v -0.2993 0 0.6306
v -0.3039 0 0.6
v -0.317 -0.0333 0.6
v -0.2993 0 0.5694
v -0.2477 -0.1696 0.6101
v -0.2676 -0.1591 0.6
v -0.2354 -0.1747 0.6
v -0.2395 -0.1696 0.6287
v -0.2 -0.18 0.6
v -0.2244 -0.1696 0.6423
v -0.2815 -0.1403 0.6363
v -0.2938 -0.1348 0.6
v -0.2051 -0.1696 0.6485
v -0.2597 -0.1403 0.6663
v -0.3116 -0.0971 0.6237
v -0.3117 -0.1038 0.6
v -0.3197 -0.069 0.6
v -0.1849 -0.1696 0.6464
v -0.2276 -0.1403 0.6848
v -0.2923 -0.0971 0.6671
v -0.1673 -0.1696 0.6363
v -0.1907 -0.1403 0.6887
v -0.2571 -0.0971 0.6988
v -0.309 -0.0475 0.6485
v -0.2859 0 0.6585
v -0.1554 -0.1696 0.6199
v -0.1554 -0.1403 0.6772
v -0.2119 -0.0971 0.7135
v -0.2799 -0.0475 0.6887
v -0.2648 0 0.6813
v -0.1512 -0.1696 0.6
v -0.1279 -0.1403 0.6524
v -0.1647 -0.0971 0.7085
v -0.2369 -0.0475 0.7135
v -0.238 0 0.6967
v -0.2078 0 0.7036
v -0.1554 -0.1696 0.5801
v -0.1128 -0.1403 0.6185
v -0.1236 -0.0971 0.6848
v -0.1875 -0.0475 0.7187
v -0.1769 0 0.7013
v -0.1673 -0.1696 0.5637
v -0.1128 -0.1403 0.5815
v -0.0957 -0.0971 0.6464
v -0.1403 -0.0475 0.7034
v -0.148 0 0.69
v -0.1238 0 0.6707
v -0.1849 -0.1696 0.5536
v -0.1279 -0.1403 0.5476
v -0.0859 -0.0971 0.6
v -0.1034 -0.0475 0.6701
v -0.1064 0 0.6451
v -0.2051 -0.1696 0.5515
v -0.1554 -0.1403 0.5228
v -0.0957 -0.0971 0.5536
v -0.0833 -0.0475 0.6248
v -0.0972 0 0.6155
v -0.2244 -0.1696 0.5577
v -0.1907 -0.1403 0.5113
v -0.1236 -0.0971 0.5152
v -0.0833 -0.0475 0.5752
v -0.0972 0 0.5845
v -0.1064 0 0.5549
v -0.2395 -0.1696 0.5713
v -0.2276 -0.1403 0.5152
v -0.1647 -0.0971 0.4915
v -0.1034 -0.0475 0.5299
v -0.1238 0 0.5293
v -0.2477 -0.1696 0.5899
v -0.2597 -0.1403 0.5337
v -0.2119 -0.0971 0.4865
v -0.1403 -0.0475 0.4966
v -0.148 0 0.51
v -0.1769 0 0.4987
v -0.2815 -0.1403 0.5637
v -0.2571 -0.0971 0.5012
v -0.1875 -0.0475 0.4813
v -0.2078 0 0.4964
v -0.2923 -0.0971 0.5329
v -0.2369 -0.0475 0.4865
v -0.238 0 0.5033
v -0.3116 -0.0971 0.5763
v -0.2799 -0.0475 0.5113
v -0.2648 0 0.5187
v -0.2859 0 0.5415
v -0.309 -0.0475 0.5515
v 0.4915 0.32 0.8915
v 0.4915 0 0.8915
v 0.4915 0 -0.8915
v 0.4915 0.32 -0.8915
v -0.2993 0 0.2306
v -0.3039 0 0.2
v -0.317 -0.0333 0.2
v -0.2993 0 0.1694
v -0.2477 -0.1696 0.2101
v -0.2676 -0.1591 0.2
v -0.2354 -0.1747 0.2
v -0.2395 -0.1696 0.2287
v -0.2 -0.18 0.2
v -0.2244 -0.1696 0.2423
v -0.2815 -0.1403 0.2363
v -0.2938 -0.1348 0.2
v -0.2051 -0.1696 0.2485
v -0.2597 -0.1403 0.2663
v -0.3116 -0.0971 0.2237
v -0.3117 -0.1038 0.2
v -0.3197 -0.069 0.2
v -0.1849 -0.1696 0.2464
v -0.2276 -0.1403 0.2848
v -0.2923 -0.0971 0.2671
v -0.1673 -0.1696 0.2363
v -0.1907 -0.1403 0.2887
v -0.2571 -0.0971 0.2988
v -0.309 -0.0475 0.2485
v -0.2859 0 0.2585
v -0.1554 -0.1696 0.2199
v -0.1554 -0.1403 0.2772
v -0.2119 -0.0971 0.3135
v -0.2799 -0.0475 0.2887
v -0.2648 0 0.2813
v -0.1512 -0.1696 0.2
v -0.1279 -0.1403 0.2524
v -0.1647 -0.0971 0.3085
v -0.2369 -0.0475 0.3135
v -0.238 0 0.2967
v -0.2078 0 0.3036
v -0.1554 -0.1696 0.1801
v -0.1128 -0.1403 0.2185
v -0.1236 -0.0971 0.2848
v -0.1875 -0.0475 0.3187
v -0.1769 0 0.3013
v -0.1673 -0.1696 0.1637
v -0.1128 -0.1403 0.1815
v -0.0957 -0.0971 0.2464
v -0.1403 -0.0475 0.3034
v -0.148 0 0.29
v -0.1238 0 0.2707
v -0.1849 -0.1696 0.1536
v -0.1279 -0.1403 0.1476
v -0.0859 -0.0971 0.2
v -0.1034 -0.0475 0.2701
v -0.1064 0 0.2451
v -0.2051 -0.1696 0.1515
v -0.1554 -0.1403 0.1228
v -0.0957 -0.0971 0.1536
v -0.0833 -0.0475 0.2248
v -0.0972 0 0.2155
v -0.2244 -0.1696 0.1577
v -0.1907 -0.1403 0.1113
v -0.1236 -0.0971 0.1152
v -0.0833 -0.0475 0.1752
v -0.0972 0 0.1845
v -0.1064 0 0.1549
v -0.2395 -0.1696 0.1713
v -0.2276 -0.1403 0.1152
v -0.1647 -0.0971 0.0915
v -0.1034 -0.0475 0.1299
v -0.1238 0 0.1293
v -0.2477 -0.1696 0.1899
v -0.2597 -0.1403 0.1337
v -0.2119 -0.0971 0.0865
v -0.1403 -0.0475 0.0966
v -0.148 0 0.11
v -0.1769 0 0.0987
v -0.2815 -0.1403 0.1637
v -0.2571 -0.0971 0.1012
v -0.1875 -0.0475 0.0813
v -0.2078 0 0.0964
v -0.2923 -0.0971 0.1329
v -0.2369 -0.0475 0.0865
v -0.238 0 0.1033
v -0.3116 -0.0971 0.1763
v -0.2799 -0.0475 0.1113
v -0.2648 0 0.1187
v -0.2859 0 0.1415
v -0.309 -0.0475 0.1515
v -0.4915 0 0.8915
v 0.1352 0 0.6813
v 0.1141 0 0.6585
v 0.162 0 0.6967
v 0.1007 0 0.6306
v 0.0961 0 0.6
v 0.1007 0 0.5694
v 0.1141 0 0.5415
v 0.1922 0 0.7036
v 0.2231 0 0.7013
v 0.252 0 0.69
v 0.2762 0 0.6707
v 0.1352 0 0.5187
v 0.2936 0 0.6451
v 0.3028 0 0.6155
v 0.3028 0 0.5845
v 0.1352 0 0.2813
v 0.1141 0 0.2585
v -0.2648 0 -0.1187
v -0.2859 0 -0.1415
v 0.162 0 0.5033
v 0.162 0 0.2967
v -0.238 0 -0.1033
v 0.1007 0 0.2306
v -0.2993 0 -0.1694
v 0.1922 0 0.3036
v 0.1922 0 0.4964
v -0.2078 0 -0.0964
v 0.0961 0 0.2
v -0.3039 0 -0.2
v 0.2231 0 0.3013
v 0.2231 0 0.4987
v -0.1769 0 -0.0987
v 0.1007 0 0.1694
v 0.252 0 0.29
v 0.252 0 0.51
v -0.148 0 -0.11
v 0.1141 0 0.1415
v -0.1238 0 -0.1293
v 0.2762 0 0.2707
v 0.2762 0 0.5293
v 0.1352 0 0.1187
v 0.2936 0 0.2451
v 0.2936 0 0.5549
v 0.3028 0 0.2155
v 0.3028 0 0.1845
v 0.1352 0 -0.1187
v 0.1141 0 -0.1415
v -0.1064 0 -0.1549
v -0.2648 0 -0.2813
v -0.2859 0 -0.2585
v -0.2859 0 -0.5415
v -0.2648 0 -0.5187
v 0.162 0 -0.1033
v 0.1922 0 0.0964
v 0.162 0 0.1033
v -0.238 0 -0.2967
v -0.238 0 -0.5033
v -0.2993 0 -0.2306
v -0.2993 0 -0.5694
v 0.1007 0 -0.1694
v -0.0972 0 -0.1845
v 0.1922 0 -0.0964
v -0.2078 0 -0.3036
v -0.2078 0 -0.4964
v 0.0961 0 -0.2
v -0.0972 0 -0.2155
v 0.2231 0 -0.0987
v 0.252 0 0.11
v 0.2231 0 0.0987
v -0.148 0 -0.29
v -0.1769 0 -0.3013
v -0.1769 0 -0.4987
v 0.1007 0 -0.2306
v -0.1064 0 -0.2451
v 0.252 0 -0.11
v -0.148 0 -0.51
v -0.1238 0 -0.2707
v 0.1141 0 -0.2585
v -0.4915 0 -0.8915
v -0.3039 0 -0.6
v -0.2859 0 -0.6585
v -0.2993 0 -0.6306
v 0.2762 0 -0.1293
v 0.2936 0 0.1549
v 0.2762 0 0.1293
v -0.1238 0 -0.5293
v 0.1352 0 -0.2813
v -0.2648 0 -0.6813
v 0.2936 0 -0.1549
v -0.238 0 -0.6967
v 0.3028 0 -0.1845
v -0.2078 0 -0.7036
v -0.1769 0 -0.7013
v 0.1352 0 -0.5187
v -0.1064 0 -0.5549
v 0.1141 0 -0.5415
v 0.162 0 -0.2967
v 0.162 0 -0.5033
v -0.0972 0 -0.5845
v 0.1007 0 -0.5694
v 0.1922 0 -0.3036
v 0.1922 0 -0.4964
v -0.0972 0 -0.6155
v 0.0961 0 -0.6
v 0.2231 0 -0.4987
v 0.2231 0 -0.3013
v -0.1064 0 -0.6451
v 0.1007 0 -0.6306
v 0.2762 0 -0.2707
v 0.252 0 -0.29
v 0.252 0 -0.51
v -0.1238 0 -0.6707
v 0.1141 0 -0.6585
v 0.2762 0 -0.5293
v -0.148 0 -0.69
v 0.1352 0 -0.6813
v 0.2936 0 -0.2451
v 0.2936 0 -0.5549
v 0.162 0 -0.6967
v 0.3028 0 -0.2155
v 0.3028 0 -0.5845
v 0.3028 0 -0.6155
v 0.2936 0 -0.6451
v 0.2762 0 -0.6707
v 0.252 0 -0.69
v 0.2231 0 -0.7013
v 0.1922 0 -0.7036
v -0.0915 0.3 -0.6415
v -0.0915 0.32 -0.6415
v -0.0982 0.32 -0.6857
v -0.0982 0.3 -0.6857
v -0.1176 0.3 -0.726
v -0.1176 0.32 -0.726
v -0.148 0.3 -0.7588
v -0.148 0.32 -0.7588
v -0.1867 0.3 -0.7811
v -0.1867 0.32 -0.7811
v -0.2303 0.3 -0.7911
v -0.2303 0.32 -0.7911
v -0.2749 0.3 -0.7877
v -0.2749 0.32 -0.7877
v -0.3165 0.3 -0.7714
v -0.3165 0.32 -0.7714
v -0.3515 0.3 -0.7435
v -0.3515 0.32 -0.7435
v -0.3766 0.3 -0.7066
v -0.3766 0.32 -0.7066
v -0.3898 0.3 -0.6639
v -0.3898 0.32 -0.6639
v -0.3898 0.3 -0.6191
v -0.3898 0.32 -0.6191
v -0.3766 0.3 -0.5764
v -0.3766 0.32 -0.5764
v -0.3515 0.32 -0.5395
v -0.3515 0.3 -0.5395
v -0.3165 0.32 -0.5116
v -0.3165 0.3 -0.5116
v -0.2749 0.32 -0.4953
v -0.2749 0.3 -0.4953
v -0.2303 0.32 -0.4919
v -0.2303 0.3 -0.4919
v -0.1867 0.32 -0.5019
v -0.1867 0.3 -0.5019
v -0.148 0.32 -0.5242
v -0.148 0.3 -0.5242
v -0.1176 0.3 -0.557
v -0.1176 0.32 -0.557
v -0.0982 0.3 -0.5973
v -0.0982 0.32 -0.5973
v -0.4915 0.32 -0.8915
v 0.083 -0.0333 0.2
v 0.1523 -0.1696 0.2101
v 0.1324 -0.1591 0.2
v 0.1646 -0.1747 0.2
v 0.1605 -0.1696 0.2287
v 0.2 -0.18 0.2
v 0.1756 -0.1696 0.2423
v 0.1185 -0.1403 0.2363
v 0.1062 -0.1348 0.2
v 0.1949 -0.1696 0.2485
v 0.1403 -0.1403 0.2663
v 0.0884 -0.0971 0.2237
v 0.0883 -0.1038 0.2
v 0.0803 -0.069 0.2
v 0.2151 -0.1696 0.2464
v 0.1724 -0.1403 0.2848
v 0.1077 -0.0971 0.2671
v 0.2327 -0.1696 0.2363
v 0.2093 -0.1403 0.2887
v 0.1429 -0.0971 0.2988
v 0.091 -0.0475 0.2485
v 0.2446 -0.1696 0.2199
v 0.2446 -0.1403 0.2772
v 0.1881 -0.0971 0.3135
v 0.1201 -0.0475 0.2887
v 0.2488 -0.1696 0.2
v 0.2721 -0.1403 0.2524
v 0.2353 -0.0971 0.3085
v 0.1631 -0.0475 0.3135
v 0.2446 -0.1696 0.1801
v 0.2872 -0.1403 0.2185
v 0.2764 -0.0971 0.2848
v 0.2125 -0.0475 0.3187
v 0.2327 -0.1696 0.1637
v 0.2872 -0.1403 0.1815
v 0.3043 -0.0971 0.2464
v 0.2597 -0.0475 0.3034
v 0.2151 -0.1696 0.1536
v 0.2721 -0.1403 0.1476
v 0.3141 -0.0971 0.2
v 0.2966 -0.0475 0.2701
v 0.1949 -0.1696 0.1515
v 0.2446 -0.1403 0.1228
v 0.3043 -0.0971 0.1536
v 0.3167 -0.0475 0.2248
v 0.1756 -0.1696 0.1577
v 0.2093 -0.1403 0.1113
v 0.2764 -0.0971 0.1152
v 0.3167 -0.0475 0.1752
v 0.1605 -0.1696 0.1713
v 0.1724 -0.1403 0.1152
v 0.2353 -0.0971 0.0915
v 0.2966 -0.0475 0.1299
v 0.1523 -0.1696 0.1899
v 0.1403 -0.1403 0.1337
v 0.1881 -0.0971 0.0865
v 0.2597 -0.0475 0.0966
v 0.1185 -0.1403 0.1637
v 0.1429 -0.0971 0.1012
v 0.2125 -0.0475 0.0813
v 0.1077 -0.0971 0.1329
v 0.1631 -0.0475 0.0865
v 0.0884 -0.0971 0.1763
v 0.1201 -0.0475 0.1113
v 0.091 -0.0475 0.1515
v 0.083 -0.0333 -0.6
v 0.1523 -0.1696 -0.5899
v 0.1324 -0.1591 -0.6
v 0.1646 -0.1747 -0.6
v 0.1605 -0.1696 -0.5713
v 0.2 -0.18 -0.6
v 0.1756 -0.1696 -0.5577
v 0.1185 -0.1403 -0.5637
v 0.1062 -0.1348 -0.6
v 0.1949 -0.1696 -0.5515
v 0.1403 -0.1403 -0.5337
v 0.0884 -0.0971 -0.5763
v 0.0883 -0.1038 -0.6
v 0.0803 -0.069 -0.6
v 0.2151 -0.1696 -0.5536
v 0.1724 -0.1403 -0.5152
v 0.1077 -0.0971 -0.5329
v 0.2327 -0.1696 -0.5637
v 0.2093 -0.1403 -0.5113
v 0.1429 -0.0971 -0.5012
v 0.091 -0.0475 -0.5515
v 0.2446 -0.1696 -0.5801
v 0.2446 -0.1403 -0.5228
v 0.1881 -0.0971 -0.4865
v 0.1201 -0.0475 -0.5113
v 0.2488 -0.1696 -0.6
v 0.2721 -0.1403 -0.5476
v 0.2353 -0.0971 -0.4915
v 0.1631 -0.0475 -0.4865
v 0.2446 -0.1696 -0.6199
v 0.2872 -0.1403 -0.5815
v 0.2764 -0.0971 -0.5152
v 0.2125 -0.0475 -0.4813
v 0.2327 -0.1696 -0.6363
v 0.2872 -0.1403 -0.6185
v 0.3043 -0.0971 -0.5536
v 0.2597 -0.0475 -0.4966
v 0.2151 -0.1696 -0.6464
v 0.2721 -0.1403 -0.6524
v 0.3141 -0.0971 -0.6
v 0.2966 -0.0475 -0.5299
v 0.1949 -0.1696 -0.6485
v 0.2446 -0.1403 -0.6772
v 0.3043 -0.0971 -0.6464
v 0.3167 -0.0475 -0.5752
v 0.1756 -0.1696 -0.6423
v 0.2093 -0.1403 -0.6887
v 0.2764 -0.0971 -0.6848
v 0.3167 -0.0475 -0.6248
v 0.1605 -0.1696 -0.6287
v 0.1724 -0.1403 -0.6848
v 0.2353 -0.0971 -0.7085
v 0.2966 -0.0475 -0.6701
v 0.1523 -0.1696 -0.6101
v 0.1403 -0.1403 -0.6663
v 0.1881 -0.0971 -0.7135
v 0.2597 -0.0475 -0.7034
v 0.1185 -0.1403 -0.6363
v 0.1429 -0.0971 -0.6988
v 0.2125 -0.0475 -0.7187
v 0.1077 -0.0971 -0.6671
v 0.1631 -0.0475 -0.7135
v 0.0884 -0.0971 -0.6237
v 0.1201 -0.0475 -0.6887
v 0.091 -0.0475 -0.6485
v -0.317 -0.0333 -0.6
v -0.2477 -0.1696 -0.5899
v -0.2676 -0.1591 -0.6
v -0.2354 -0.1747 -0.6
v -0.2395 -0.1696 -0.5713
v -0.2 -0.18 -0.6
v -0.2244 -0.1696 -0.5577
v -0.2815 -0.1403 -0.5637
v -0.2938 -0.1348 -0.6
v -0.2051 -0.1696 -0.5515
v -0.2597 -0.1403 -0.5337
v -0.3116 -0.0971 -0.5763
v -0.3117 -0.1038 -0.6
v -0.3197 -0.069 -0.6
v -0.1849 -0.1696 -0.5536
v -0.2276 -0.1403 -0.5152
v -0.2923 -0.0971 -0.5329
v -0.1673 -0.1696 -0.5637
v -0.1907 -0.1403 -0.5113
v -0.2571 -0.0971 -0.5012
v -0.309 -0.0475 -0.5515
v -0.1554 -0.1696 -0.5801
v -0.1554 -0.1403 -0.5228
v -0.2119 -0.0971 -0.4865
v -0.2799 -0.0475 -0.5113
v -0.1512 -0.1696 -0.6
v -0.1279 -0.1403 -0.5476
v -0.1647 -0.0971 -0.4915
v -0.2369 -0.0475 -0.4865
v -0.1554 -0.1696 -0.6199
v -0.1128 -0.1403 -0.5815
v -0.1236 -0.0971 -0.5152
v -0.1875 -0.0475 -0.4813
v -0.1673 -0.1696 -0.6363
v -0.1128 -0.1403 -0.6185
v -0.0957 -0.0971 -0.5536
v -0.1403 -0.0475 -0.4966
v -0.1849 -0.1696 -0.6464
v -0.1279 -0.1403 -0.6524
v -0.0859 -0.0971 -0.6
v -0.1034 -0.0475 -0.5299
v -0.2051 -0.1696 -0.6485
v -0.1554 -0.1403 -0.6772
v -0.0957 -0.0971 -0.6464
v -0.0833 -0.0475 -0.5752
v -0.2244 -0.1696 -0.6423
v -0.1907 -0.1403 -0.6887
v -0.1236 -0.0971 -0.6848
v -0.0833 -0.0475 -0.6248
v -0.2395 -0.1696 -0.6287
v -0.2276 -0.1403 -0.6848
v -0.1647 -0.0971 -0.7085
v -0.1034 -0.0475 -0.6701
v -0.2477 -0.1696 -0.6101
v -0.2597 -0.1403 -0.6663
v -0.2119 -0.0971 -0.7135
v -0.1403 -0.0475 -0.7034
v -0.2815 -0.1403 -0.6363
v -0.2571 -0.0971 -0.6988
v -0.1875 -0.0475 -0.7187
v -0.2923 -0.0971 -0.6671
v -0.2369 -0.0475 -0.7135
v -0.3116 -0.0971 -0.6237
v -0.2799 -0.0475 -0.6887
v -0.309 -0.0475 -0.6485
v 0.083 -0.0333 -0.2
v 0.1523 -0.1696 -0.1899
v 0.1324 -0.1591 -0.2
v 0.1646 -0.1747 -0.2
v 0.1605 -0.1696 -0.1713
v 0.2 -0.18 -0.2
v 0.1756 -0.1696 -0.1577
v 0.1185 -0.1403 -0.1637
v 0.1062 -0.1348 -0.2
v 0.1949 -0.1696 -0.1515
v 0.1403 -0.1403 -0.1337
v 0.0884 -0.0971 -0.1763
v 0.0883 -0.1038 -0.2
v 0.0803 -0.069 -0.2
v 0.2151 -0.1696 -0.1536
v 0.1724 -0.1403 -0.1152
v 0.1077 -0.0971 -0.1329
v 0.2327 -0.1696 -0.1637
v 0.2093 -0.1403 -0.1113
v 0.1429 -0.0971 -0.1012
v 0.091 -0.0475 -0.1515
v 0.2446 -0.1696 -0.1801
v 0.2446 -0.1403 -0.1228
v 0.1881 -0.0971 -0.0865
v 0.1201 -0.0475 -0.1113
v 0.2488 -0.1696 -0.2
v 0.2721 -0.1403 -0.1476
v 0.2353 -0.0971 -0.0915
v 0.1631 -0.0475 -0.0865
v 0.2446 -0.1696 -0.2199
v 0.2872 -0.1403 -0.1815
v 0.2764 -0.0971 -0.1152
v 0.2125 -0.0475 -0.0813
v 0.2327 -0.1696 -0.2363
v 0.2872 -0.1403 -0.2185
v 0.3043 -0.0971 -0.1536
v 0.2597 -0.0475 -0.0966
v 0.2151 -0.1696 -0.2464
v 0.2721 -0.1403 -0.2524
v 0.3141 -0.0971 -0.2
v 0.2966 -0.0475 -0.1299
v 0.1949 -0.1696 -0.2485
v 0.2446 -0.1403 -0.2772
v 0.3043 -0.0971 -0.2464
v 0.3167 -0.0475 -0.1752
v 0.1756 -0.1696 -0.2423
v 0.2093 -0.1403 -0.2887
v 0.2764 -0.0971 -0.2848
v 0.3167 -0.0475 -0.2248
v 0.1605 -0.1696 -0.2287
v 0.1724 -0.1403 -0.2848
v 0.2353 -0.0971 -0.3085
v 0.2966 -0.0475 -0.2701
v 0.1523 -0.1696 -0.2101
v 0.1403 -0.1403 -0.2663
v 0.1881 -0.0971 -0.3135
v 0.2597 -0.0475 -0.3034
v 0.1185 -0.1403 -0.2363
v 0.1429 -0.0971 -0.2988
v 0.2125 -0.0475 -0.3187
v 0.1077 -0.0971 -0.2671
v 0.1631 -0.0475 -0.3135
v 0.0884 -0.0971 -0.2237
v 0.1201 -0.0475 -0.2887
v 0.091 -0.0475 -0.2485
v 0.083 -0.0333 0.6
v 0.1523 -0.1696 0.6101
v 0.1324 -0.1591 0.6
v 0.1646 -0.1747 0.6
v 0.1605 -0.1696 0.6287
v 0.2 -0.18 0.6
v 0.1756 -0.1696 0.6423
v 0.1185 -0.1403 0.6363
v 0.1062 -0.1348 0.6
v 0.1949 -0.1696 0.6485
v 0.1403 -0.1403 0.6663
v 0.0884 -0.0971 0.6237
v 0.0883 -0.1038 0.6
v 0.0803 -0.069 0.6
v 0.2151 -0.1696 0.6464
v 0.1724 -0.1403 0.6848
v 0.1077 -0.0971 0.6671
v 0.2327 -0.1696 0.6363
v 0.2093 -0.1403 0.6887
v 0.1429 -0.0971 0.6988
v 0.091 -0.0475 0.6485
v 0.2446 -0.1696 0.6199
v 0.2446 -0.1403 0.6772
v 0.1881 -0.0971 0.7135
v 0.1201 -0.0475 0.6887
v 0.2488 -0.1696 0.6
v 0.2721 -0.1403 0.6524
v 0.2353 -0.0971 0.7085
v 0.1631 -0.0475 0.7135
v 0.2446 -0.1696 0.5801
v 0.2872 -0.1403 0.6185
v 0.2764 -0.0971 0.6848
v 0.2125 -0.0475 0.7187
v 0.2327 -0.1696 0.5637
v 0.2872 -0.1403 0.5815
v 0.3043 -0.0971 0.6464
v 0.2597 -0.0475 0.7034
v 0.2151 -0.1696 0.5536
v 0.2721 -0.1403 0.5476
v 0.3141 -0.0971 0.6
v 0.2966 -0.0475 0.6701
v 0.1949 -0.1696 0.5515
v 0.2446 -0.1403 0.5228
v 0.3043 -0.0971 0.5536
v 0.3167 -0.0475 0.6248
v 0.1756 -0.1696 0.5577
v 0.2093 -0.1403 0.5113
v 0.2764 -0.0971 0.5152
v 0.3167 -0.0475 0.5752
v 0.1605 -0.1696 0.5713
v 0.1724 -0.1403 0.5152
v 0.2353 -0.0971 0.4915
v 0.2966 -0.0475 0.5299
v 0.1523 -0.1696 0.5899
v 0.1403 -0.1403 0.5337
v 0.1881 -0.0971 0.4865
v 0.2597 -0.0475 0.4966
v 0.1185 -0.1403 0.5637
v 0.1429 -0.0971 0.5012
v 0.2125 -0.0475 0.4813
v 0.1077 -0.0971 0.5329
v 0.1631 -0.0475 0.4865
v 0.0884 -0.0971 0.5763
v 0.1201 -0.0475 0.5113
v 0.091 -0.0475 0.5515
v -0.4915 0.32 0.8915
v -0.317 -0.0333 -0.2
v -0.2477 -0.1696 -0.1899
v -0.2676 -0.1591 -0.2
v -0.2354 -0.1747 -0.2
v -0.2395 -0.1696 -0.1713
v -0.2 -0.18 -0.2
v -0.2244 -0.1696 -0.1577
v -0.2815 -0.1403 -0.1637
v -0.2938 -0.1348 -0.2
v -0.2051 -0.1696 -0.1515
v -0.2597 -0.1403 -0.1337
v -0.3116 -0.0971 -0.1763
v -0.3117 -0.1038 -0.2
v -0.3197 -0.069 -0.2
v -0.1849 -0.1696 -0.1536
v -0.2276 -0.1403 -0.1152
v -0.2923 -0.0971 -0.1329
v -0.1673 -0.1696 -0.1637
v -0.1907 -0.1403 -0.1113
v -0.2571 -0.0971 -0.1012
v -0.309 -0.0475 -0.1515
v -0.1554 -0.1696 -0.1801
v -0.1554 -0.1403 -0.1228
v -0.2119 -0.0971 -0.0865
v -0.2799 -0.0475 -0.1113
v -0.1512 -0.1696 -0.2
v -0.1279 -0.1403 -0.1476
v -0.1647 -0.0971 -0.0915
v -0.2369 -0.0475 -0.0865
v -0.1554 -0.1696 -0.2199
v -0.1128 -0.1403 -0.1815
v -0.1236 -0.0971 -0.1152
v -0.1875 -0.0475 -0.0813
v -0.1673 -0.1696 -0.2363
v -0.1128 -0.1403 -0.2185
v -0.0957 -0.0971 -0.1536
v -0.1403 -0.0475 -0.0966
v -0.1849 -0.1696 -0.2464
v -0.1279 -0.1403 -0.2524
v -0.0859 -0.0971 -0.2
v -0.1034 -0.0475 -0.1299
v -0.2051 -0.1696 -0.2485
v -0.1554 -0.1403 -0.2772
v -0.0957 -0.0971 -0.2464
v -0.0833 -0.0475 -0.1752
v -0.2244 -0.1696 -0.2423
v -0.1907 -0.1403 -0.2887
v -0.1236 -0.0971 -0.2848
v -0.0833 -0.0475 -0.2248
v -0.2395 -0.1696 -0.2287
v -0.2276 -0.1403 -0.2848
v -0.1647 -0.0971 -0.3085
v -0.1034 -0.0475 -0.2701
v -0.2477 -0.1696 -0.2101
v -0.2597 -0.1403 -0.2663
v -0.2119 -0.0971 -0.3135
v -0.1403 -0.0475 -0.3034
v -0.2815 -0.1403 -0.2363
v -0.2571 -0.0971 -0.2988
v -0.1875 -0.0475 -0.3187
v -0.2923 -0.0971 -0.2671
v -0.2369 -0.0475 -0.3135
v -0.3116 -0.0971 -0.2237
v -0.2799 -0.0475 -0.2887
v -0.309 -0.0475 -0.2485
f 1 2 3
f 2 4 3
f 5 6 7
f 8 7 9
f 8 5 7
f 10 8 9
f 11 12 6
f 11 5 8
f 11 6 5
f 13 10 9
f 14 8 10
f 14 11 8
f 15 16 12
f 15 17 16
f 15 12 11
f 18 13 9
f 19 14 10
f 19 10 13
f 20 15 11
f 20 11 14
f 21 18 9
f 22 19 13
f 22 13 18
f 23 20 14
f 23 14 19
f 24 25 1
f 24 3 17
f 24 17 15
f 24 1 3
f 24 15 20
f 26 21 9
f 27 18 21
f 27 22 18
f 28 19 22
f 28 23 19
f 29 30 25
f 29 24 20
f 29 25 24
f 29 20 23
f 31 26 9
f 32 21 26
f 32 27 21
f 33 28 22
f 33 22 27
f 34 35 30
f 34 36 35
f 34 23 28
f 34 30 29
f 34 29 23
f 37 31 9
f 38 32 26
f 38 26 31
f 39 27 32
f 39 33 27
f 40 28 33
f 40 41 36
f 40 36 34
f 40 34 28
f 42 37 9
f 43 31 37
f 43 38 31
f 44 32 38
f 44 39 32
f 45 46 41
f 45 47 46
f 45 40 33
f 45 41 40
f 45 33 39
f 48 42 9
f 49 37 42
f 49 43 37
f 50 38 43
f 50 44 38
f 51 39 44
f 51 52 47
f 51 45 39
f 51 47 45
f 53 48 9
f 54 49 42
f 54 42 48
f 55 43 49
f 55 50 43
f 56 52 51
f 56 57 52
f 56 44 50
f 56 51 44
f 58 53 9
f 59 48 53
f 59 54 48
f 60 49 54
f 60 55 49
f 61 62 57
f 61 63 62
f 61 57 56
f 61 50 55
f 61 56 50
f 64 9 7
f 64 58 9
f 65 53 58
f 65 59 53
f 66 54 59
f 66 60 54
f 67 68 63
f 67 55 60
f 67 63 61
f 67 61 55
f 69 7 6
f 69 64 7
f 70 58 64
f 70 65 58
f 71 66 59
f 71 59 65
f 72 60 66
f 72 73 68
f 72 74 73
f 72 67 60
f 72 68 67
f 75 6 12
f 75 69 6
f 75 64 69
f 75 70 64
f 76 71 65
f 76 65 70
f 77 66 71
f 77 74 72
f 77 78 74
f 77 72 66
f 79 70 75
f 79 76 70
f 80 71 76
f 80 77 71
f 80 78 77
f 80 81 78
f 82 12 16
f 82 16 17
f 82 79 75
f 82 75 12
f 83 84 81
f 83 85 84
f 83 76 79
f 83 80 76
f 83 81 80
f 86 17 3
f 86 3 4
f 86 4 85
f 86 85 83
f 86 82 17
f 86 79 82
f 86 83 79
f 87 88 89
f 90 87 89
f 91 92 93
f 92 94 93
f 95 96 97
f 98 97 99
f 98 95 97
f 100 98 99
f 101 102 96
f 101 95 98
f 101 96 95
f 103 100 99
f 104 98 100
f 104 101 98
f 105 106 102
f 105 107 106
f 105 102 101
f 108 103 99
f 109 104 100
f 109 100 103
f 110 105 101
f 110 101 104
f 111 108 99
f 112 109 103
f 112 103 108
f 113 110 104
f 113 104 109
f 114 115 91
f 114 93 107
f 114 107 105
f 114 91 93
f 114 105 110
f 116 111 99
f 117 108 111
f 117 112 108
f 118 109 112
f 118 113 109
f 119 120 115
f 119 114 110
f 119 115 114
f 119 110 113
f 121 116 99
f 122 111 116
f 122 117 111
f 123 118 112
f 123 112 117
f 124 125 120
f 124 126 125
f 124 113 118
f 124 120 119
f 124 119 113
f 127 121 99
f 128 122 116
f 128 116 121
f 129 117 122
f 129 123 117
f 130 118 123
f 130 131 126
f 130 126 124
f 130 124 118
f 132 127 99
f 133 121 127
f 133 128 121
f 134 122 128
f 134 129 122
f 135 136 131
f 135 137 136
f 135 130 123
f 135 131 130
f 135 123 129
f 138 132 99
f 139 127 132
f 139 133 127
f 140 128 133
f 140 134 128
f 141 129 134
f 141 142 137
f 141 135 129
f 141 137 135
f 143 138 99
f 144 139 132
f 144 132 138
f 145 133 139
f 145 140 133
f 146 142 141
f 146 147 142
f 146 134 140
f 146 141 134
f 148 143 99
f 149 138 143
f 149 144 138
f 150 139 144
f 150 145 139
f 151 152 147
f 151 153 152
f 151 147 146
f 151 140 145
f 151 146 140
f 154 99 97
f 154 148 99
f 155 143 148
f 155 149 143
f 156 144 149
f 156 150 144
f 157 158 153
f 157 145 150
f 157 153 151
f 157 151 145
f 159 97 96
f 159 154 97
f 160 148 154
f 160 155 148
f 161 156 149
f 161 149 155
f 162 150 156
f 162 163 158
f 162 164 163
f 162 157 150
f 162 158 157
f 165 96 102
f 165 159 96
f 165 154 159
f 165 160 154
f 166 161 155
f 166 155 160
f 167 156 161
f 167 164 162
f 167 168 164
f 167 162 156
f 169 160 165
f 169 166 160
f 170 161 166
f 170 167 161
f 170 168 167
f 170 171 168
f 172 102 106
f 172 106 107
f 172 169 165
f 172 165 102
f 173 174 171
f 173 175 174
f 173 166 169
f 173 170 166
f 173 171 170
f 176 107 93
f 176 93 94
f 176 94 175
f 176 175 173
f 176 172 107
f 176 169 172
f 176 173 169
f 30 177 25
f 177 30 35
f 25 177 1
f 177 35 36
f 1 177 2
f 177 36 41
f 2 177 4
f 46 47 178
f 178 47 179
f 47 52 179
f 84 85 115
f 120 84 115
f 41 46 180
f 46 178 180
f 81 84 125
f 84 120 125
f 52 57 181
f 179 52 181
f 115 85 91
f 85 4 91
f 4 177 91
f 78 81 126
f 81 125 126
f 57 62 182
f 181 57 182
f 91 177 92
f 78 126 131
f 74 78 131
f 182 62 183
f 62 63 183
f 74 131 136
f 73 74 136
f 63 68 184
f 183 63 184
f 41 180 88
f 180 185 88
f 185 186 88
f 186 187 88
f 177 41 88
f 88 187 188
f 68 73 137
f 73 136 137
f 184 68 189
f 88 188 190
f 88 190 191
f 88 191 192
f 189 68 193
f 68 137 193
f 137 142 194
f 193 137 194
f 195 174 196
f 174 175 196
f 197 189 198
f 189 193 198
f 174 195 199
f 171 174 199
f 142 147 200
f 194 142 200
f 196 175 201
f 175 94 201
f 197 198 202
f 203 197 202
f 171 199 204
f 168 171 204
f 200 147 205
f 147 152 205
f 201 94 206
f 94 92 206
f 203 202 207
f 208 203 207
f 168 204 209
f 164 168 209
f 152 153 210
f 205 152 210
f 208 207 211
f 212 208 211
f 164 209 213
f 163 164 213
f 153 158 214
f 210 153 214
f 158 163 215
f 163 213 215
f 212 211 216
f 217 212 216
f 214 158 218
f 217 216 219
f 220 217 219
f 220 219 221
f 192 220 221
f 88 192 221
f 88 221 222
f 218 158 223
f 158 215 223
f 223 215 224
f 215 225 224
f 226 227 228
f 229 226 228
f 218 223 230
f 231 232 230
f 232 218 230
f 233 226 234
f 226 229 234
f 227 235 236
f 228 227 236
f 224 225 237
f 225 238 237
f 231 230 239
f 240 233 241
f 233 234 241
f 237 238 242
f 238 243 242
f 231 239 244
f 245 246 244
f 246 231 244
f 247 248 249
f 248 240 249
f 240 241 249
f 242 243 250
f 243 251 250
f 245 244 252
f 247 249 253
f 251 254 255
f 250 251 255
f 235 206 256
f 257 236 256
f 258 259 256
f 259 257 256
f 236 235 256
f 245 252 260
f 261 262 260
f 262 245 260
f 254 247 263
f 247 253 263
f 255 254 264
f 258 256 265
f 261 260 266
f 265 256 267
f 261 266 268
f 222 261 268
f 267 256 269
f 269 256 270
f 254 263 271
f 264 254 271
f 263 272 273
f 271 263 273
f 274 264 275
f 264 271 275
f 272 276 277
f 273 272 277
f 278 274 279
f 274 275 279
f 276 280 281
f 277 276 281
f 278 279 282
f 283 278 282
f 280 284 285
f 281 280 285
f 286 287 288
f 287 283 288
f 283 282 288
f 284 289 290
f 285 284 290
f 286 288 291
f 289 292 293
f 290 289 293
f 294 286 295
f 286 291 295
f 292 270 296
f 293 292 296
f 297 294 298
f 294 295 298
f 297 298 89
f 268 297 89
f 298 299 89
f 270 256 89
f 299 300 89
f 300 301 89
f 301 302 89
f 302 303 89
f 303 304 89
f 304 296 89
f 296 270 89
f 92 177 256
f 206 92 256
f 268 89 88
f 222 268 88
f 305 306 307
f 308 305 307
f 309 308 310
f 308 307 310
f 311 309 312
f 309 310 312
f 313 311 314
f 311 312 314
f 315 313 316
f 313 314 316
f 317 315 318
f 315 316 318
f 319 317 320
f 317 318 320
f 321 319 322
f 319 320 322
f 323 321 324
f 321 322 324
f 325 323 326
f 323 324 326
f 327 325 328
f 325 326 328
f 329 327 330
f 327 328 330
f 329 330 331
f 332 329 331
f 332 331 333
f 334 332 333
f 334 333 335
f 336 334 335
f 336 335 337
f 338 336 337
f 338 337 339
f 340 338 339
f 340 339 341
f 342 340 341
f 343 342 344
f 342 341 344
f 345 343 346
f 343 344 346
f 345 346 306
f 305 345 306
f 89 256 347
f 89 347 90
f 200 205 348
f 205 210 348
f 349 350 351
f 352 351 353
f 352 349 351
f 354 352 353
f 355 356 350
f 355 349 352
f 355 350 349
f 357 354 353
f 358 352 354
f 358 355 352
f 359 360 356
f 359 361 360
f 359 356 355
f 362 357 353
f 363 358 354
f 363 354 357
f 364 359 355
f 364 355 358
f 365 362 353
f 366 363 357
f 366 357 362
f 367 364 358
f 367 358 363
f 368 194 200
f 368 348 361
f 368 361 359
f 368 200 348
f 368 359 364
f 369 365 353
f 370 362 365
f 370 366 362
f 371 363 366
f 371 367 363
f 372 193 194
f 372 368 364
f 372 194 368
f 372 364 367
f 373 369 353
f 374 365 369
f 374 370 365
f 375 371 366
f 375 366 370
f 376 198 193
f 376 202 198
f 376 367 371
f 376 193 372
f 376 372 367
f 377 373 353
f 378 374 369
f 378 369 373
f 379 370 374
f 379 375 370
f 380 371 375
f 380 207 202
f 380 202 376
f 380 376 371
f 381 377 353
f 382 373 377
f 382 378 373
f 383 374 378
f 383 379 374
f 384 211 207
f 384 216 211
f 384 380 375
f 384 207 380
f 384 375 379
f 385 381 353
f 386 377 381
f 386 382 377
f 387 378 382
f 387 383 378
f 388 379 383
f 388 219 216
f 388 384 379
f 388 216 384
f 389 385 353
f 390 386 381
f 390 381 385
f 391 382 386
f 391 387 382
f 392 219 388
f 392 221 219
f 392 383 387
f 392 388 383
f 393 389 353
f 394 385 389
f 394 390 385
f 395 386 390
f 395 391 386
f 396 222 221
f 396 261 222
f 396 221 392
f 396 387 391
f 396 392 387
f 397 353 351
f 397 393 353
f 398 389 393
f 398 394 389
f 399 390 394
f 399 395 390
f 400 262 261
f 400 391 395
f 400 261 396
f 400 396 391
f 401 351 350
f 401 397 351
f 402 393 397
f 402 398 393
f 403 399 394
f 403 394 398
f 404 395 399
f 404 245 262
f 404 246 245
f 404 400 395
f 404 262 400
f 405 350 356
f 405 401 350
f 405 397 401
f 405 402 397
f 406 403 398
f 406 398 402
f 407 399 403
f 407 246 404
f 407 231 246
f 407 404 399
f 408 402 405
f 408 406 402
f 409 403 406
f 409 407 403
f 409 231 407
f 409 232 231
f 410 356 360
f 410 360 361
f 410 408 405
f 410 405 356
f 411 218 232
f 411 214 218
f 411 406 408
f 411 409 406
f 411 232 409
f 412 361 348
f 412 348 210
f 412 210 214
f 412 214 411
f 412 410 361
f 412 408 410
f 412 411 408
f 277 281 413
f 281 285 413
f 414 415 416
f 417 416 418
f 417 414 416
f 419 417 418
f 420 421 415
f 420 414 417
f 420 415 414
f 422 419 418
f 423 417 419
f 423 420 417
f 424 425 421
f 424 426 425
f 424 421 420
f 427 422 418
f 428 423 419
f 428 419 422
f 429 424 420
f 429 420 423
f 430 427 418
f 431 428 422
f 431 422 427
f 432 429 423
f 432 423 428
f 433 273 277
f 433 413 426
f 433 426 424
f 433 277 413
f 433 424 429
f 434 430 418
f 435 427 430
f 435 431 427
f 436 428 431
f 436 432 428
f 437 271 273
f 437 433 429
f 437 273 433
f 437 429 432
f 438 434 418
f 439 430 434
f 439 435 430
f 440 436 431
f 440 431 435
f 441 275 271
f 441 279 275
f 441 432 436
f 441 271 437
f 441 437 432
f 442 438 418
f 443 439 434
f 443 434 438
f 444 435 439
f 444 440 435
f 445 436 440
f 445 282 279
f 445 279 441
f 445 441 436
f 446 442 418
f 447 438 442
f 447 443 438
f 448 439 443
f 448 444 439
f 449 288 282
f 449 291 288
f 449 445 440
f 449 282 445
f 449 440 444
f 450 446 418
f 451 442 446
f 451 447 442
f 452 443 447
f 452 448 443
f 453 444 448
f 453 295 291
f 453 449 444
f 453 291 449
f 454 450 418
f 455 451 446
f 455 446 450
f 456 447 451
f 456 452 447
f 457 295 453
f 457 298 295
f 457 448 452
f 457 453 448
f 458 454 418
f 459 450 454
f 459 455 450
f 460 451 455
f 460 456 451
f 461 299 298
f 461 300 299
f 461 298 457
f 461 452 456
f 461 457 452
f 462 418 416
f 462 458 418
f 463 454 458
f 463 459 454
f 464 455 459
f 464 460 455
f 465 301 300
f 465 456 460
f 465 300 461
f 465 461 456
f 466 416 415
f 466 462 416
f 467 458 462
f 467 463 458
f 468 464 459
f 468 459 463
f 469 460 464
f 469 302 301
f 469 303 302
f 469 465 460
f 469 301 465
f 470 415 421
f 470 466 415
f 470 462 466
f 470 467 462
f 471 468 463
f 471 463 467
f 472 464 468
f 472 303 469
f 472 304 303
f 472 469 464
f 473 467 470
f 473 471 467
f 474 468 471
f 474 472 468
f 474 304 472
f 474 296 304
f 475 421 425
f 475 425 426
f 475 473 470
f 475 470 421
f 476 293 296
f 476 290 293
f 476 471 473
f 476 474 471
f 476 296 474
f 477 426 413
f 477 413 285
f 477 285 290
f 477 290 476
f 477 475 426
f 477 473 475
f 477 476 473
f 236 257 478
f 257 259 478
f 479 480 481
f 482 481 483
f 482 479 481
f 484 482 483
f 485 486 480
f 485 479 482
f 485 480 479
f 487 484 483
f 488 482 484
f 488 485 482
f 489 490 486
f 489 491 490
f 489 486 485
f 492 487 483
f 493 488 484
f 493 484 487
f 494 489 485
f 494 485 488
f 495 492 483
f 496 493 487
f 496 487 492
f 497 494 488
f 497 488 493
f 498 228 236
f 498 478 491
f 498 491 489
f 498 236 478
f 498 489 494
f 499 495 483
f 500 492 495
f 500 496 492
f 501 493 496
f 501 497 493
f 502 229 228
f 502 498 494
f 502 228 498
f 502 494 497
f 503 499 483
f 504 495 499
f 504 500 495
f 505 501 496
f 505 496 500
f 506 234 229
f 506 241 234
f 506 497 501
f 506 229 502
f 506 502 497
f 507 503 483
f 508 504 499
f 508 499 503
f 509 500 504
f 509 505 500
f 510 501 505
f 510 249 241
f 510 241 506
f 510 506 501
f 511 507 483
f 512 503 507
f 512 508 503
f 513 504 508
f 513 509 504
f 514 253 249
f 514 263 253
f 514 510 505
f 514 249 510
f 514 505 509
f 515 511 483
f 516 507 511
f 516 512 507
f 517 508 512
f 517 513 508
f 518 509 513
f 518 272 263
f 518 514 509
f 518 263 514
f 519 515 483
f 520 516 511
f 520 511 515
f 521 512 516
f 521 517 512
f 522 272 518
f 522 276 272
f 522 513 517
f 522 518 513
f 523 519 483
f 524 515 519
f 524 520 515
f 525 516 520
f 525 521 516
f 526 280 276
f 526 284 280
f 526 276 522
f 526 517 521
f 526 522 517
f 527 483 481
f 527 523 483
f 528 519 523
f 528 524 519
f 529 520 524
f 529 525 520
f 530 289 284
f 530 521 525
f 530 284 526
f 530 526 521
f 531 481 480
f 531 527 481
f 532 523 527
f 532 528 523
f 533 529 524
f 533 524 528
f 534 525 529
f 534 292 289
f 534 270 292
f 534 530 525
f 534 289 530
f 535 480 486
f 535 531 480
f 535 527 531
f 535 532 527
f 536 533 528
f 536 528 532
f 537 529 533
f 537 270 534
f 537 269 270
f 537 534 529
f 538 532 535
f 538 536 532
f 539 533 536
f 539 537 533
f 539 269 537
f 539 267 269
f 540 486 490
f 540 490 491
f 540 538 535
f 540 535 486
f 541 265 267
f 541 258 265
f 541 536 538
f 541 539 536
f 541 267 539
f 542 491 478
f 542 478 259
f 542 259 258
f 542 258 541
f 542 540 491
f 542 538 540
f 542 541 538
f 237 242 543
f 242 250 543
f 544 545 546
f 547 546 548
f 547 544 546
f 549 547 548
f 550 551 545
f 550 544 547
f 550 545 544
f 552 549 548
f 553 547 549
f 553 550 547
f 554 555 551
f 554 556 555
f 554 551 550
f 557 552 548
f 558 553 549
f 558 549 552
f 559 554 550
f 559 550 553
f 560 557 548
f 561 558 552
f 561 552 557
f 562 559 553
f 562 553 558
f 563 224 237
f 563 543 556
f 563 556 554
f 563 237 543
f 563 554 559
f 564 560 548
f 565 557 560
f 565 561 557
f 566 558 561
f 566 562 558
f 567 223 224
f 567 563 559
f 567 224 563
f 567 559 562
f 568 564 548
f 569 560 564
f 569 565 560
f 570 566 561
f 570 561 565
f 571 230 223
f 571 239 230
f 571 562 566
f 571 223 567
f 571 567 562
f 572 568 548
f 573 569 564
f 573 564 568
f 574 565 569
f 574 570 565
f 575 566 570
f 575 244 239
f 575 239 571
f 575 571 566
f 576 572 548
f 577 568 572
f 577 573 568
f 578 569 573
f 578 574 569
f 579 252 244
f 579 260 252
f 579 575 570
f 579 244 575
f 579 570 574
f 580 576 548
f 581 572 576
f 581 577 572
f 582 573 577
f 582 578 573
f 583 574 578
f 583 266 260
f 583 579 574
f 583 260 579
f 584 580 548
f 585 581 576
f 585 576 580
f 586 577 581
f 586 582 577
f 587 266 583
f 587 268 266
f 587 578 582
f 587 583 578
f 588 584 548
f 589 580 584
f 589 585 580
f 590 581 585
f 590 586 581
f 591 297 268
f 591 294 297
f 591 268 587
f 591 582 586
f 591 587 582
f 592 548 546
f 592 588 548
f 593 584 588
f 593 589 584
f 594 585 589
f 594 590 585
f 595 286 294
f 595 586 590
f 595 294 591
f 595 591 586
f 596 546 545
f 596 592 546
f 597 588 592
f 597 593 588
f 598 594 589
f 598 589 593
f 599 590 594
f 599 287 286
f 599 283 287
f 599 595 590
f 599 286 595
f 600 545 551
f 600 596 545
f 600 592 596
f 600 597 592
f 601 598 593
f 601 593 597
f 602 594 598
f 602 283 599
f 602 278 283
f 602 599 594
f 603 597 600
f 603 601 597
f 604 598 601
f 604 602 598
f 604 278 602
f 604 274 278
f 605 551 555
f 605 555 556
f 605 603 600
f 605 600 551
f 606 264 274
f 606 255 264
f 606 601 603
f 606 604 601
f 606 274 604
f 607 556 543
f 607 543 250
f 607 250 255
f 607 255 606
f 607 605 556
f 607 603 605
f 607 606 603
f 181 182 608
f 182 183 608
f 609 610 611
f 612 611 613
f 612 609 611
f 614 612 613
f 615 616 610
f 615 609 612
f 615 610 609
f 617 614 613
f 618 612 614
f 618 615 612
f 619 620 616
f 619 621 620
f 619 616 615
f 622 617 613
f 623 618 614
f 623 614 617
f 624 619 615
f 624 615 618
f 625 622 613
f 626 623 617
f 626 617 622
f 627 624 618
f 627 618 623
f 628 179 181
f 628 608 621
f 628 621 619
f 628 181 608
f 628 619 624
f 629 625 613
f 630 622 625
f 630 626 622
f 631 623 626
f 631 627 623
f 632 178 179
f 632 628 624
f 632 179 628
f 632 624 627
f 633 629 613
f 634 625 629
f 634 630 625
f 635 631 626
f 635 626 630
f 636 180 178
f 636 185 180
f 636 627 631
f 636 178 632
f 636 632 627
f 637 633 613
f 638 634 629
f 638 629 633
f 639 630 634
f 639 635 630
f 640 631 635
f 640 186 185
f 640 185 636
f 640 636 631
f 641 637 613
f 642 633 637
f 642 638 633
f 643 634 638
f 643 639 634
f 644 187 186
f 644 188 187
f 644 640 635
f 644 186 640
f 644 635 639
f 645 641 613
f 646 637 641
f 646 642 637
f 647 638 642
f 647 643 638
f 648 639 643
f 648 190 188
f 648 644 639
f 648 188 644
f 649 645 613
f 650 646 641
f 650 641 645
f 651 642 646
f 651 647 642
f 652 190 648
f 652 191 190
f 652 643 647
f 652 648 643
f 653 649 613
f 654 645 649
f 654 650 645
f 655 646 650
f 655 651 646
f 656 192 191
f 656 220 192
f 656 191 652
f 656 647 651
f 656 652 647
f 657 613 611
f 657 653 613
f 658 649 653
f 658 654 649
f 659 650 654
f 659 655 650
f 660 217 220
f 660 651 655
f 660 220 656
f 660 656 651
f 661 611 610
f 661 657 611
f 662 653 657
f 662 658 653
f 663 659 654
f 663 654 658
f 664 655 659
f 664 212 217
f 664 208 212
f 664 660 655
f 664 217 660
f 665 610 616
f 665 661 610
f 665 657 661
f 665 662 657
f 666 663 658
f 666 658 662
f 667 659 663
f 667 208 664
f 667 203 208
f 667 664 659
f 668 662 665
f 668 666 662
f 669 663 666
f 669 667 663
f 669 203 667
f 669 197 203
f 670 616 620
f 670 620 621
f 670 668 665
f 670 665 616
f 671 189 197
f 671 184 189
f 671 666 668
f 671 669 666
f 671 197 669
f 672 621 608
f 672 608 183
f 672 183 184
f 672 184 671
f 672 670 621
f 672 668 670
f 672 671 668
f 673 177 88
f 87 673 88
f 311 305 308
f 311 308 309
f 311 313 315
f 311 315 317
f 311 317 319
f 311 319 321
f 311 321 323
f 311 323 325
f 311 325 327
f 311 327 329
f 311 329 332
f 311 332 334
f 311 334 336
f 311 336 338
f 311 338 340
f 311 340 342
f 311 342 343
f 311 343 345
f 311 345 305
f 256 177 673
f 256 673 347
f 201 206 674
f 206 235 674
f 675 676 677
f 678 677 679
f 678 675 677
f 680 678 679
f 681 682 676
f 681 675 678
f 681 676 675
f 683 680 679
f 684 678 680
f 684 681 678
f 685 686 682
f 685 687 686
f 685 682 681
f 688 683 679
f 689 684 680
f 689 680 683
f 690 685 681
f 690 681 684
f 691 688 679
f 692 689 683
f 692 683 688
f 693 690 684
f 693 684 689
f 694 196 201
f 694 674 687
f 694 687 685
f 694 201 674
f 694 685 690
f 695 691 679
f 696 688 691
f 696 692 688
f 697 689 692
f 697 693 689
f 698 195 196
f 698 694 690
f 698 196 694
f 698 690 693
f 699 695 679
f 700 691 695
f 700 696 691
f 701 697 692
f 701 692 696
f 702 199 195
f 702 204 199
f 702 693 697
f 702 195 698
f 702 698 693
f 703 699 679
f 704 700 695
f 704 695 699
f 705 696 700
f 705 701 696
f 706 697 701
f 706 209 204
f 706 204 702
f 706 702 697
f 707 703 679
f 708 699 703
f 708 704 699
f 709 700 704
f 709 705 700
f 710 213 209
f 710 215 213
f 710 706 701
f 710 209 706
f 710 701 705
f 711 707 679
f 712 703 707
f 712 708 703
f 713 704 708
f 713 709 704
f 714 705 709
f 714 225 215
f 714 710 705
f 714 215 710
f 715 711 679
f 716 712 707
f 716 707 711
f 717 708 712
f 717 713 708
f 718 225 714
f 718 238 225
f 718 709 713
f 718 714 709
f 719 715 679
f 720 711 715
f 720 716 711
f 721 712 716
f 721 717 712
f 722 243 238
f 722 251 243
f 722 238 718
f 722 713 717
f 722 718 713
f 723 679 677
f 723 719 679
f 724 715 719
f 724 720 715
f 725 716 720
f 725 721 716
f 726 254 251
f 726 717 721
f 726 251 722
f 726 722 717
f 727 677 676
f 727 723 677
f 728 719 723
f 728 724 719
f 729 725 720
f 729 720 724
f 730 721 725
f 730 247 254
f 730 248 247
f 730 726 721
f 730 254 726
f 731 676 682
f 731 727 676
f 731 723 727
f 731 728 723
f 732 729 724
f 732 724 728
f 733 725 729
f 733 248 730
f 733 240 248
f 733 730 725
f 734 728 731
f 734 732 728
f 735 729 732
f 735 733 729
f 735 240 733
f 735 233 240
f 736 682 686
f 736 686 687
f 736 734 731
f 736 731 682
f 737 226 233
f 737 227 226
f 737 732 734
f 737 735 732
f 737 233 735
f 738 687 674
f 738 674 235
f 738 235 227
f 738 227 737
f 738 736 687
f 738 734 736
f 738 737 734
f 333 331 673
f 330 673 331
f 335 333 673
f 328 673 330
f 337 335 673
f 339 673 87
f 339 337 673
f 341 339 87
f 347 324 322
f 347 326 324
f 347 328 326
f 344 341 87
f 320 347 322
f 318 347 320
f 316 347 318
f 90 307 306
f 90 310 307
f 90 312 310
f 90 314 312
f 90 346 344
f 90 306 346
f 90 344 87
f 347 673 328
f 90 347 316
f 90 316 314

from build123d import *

# Parameters (mm, degrees)
SKETCH1_W            = 0.983
SKETCH1_H            = 1.783
BOSS_EXTRUDE1_DEPTH  = 0.32
LPATTERN1_COUNT      = 4
LPATTERN1_PITCH      = 0.4
LPATTERN1_COUNT_DIR2 = 2
LPATTERN1_PITCH_DIR2 = 0.4
SKETCH3_R            = 0.15
CUT_EXTRUDE1_DEPTH   = 0.02


with BuildPart() as part:
    # Sketch1 → Boss-Extrude1 (new body)
    with BuildSketch(Plane(origin=(0, 0, 0), x_dir=(1, 0, 0), z_dir=(0, 1, 0))):
        Rectangle(SKETCH1_W, SKETCH1_H)
    extrude(amount=BOSS_EXTRUDE1_DEPTH)

    # Sketch2 → Revolve1 (revolve)
    with BuildSketch(Plane.XY.offset(0.6)):
        with BuildLine():
            Line((-0.303923048, 0), (-0.2, 0))
            Line((-0.2, 0), (-0.2, -0.18))
            ThreePointArc((-0.2, -0.18), (-0.303923048, -0.12), (-0.303923048, 0))
        make_face()
    revolve1 = revolve(axis=Axis((-0.2, -0.18, 0.6), (0, 1, 0)))

    # LPattern1: Revolve1 4 × 2
    with Locations(*[(j * LPATTERN1_PITCH_DIR2, 0, -i * LPATTERN1_PITCH) for i in range(LPATTERN1_COUNT) for j in range(LPATTERN1_COUNT_DIR2) if (i, j) != (0, 0)]):
        add(revolve1)

    # Sketch3 → Cut-Extrude1 (cut)
    with BuildSketch(Plane(origin=(0, 0.32, 0), x_dir=(1, 0, 0), z_dir=(0, 1, 0))):
        with Locations((-0.2415, 0.6415)):
            Circle(SKETCH3_R)
    extrude(amount=-CUT_EXTRUDE1_DEPTH, mode=Mode.SUBTRACT)


solid = part.part
